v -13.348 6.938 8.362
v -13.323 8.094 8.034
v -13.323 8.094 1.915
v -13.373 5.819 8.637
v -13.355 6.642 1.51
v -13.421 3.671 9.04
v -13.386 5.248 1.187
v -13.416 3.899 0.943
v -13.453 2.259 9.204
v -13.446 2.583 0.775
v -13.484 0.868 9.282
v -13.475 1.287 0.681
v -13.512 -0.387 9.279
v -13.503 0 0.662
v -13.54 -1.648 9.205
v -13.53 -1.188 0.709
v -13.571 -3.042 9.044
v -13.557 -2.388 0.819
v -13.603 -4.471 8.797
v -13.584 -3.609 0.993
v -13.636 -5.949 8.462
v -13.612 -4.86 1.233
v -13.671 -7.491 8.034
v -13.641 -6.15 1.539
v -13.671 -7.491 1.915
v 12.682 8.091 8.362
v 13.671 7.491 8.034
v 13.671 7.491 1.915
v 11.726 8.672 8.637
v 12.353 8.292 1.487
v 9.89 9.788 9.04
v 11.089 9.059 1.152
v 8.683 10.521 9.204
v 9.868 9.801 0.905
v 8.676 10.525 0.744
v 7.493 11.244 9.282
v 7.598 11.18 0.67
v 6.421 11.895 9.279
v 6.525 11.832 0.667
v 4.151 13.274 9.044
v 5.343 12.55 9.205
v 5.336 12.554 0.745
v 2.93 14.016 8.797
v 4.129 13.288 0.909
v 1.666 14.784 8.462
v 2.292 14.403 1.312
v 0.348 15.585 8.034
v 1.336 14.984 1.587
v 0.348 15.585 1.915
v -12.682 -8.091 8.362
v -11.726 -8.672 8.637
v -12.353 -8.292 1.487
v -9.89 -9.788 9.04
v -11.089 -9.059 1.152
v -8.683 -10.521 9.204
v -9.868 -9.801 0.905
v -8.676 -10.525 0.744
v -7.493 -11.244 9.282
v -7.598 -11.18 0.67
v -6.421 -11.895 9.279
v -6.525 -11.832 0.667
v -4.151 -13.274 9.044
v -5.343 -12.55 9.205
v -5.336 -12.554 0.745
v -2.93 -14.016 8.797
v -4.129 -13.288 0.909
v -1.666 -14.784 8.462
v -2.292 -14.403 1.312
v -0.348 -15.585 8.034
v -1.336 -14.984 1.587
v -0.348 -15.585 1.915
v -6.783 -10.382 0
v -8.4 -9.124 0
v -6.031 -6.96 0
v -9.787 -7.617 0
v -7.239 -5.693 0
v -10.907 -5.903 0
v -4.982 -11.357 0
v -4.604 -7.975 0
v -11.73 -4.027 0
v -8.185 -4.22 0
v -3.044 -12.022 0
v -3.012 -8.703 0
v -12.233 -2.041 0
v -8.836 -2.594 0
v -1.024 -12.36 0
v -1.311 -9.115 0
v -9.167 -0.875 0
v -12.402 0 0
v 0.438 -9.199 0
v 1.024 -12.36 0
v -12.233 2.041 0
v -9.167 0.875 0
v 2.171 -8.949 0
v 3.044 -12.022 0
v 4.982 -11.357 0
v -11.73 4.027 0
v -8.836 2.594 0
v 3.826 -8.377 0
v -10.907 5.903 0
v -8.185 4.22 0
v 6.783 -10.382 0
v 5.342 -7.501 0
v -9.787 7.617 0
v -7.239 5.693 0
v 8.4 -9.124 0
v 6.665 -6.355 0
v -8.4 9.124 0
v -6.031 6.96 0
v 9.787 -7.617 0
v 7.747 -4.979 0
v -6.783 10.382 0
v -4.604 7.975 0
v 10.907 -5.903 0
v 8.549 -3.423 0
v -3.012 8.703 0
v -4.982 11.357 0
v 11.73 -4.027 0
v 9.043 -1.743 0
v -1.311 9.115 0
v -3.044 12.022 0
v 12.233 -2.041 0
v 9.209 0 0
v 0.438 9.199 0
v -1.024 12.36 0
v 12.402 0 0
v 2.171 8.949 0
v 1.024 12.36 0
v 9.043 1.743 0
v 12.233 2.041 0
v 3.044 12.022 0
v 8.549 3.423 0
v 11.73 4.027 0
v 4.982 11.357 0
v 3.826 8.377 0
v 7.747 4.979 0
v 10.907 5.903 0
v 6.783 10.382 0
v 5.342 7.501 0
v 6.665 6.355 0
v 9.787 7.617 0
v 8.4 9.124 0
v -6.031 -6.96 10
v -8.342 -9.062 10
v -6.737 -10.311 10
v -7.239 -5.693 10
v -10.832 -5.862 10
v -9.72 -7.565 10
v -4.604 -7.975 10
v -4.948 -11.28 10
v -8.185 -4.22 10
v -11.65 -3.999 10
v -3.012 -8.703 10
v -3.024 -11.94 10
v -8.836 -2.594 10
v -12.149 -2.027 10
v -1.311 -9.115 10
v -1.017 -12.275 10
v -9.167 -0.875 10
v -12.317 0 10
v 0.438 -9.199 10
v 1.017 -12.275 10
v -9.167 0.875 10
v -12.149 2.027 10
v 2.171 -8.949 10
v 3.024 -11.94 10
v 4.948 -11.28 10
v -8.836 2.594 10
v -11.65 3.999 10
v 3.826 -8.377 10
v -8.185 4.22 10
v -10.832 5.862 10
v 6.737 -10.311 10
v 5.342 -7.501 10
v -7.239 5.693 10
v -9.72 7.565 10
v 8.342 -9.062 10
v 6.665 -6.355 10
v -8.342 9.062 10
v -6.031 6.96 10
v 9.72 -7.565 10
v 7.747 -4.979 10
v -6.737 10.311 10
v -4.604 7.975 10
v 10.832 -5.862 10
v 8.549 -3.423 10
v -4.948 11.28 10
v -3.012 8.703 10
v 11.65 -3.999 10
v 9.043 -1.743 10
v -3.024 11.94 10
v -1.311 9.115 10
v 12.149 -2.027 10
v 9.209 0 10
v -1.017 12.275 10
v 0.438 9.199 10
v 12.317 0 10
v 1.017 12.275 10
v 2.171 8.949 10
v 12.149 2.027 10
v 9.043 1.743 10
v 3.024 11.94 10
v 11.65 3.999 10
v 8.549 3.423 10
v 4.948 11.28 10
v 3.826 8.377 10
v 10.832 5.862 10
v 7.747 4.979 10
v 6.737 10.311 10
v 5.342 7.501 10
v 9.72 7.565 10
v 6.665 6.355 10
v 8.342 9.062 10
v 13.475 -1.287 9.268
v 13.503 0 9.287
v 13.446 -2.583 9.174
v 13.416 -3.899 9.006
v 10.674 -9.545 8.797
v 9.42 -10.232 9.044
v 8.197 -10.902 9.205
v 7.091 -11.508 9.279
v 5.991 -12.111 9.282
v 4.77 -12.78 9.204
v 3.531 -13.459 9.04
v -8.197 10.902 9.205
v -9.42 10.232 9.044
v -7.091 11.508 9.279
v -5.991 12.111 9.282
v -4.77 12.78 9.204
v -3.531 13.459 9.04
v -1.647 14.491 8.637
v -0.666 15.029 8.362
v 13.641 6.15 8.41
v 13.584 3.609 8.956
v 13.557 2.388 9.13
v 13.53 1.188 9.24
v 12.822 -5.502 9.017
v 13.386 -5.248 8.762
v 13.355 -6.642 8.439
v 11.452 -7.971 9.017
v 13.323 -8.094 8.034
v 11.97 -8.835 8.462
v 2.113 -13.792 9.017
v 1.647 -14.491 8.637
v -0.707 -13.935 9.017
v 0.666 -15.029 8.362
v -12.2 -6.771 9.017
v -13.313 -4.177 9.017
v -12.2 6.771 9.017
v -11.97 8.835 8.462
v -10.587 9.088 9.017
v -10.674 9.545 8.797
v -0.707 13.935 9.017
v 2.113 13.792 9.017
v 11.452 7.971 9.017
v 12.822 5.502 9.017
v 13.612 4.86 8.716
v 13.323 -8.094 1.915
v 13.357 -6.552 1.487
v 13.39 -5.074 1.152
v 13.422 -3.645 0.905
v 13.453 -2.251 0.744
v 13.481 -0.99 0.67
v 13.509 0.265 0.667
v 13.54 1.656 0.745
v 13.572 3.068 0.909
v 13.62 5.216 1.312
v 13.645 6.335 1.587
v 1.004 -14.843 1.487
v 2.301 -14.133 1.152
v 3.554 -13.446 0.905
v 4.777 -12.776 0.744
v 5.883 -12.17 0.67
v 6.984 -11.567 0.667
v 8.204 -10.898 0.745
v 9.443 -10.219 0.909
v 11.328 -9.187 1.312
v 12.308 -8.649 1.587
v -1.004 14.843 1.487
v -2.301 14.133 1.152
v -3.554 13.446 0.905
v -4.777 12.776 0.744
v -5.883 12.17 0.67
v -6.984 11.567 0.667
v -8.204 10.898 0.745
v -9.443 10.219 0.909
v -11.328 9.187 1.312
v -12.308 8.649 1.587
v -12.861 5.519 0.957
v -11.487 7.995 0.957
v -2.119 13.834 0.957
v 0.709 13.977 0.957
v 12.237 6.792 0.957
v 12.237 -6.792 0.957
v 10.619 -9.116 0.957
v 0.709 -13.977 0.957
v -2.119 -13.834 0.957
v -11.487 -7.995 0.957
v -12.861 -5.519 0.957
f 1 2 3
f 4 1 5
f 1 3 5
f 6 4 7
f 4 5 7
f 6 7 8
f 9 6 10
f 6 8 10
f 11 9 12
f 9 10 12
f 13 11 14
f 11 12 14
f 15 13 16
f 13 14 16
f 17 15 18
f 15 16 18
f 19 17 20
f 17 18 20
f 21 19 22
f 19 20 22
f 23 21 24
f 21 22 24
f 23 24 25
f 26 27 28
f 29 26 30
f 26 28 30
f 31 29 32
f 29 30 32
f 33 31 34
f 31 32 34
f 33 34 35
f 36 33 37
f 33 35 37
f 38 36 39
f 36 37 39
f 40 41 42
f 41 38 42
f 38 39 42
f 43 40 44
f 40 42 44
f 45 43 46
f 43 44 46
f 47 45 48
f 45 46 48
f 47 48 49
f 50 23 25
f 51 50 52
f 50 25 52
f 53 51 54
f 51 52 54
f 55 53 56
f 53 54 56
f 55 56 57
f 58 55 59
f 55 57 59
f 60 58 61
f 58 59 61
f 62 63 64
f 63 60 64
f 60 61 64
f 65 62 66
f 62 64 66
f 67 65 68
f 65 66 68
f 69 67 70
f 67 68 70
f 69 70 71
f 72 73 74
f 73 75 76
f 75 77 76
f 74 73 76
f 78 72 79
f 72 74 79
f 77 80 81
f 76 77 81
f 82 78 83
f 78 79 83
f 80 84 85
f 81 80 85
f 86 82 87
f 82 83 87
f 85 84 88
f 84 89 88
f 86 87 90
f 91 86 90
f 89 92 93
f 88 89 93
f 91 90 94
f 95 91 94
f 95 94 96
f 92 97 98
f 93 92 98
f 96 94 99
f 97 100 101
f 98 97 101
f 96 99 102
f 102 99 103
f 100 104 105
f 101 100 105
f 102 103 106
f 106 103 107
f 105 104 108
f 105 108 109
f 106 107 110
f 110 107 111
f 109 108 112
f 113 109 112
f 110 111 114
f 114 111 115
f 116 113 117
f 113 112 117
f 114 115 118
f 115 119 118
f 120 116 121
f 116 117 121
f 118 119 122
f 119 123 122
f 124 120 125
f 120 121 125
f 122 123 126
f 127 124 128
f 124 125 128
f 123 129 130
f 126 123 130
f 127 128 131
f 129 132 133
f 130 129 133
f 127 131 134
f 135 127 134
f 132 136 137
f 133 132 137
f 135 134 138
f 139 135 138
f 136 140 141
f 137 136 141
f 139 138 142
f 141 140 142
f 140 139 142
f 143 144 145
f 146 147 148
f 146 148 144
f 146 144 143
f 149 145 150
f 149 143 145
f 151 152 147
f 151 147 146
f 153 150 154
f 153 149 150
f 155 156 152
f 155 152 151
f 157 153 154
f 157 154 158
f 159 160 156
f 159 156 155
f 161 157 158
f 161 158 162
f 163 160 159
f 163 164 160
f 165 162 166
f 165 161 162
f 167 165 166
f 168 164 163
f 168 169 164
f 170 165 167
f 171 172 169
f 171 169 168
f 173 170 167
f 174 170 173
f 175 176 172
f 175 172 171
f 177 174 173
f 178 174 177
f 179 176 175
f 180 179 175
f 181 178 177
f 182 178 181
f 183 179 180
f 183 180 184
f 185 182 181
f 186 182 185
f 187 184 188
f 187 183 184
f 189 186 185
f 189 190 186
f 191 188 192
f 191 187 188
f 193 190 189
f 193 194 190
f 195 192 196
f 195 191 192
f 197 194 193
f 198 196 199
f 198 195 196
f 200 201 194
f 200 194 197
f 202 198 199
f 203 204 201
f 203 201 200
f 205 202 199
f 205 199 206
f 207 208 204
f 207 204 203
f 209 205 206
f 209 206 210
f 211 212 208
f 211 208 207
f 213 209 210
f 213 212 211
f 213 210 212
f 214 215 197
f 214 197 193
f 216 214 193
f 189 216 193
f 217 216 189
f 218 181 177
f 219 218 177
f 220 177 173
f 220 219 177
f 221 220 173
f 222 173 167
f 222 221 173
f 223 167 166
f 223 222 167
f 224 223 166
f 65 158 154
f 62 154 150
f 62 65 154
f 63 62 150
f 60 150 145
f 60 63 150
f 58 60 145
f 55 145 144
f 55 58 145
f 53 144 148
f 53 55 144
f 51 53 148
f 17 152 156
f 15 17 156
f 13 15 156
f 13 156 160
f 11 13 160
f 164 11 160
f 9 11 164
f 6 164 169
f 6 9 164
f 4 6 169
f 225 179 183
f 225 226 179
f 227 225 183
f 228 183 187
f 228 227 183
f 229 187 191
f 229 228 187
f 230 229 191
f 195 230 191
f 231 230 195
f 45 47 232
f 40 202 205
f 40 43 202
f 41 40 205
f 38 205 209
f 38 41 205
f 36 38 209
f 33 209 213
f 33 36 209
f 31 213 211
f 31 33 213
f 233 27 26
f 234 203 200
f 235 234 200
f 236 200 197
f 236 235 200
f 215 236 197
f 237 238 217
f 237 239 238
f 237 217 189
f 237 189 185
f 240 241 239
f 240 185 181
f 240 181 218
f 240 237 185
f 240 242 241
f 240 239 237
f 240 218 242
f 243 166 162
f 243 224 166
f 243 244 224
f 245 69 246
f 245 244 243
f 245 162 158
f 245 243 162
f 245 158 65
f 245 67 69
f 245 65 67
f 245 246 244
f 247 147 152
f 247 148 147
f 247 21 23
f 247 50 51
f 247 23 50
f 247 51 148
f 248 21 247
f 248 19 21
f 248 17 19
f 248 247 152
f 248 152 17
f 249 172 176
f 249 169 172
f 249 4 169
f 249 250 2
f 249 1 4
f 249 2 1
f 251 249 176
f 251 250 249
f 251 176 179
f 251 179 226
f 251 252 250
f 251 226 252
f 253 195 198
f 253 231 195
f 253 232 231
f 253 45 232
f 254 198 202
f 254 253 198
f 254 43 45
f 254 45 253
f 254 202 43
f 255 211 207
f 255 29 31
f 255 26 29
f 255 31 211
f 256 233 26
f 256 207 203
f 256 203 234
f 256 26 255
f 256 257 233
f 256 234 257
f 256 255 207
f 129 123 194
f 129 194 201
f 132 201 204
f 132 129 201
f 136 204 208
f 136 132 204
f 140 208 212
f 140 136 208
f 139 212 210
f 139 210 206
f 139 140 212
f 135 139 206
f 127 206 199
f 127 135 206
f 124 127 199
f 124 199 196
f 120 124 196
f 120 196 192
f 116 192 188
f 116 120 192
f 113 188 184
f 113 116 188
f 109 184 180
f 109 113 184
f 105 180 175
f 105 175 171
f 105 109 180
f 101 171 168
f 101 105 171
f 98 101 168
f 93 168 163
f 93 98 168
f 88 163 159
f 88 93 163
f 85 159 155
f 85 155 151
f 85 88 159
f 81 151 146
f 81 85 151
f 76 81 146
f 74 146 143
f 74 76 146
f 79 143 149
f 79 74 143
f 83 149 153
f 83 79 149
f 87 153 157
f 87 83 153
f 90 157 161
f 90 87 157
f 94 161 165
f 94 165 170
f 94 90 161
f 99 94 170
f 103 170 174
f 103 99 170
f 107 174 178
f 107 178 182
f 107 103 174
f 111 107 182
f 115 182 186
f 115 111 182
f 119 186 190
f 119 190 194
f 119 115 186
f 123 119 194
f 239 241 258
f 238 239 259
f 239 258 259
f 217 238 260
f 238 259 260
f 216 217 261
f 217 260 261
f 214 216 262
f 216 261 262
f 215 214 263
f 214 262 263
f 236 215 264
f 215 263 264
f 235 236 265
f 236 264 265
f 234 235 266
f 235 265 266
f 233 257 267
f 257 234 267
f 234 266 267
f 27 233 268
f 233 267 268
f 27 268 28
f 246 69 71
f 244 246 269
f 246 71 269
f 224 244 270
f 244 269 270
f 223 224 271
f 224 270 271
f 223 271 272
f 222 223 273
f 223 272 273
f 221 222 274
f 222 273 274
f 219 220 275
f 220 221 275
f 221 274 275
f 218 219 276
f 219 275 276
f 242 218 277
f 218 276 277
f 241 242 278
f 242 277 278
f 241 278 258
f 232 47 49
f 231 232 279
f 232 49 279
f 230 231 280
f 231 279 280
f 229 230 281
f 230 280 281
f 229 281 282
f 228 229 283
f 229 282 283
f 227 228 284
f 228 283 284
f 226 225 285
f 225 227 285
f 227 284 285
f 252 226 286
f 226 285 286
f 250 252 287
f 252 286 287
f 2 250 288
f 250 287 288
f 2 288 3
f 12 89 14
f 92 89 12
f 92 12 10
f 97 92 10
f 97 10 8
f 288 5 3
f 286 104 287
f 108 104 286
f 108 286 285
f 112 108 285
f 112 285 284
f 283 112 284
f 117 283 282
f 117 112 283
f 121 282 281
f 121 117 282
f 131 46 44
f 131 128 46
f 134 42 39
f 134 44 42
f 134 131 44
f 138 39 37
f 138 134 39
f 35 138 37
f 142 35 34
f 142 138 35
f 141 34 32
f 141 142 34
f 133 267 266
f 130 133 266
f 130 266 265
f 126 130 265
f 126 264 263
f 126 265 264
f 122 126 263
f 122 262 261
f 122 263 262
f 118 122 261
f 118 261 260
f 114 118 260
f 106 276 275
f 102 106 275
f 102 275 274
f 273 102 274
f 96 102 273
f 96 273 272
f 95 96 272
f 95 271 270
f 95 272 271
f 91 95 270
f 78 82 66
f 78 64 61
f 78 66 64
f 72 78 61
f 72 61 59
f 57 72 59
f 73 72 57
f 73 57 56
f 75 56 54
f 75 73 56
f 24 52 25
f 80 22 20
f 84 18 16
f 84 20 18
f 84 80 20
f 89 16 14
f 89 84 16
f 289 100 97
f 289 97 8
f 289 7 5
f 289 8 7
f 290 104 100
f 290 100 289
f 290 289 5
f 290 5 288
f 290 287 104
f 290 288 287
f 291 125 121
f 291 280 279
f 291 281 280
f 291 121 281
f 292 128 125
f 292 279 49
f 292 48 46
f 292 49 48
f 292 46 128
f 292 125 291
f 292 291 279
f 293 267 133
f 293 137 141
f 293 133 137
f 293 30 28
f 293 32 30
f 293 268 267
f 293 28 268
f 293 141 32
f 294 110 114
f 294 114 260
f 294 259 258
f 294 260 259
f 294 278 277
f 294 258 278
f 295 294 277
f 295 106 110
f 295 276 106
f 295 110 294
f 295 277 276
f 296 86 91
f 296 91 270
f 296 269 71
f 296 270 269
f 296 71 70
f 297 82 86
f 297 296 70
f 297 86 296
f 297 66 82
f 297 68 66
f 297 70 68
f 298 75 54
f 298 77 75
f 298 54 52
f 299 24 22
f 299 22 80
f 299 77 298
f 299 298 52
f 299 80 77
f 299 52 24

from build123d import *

# Parameters (mm, degrees)
CROQUIS1_R              = 9.208992718
SALIENTE_EXTRUIR1_DEPTH = 10
CROQUIS2_R              = 30.329695967
CROQUIS2_R_2            = 12.316965918
CORTAR_EXTRUIR1_DEPTH   = 10
CORTAR_EXTRUIR1_TAPER   = 59
CROQUIS3_R              = 29.014091156
CROQUIS3_R_2            = 12.401894161
CORTAR_EXTRUIR2_DEPTH   = 10
CORTAR_EXTRUIR2_DRAFT   = -59


with BuildPart() as part:
    # Croquis1 → Saliente-Extruir1 (new body)
    with BuildSketch(Plane.XY):
        Polygon((-13.322559753, 8.093787843), (-13.670705761, -7.490781268), (-0.348146008, -15.58456911), (13.322559753, -8.093787843), (13.670705761, 7.490781268), (0.348146008, 15.58456911), align=None)
        Circle(CROQUIS1_R, mode=Mode.SUBTRACT)
    extrude(amount=SALIENTE_EXTRUIR1_DEPTH)

    # Croquis2 → Cortar-Extruir1 (cut)
    with BuildSketch(Plane.XY.offset(10)):
        Circle(CROQUIS2_R)
        Circle(CROQUIS2_R_2, mode=Mode.SUBTRACT)
    extrude(amount=-CORTAR_EXTRUIR1_DEPTH, taper=CORTAR_EXTRUIR1_TAPER, mode=Mode.SUBTRACT)


with BuildPart() as cortar_extruir2_tool:
    # Croquis3 → Cortar-Extruir2 (with draft: the straight prism first)
    with BuildSketch(Plane(origin=(0, 0, 0), x_dir=(-1, 0, 0), z_dir=(0, 0, -1))):
        Circle(CROQUIS3_R)
        Circle(CROQUIS3_R_2, mode=Mode.SUBTRACT)
    extrude(amount=-CORTAR_EXTRUIR2_DEPTH)
    # Cortar-Extruir2: the draft: its side faces are tilted about the plane it starts from
    cortar_extruir2_sides = [cortar_extruir2_tool.faces().sort_by_distance(p)[0] for p in [
        (29.014091156, 0, 5),
        (12.401894161, 0, 5),
    ]]
    draft(cortar_extruir2_sides, Plane(origin=(0, 0, 0), x_dir=(-1, 0, 0), z_dir=(0, 0, -1)), CORTAR_EXTRUIR2_DRAFT)


with BuildPart() as part_1:
    add(part.part)

    # Cortar-Extruir2: cut by cortar_extruir2_tool
    add(cortar_extruir2_tool.part, mode=Mode.SUBTRACT)


solid = part_1.part
